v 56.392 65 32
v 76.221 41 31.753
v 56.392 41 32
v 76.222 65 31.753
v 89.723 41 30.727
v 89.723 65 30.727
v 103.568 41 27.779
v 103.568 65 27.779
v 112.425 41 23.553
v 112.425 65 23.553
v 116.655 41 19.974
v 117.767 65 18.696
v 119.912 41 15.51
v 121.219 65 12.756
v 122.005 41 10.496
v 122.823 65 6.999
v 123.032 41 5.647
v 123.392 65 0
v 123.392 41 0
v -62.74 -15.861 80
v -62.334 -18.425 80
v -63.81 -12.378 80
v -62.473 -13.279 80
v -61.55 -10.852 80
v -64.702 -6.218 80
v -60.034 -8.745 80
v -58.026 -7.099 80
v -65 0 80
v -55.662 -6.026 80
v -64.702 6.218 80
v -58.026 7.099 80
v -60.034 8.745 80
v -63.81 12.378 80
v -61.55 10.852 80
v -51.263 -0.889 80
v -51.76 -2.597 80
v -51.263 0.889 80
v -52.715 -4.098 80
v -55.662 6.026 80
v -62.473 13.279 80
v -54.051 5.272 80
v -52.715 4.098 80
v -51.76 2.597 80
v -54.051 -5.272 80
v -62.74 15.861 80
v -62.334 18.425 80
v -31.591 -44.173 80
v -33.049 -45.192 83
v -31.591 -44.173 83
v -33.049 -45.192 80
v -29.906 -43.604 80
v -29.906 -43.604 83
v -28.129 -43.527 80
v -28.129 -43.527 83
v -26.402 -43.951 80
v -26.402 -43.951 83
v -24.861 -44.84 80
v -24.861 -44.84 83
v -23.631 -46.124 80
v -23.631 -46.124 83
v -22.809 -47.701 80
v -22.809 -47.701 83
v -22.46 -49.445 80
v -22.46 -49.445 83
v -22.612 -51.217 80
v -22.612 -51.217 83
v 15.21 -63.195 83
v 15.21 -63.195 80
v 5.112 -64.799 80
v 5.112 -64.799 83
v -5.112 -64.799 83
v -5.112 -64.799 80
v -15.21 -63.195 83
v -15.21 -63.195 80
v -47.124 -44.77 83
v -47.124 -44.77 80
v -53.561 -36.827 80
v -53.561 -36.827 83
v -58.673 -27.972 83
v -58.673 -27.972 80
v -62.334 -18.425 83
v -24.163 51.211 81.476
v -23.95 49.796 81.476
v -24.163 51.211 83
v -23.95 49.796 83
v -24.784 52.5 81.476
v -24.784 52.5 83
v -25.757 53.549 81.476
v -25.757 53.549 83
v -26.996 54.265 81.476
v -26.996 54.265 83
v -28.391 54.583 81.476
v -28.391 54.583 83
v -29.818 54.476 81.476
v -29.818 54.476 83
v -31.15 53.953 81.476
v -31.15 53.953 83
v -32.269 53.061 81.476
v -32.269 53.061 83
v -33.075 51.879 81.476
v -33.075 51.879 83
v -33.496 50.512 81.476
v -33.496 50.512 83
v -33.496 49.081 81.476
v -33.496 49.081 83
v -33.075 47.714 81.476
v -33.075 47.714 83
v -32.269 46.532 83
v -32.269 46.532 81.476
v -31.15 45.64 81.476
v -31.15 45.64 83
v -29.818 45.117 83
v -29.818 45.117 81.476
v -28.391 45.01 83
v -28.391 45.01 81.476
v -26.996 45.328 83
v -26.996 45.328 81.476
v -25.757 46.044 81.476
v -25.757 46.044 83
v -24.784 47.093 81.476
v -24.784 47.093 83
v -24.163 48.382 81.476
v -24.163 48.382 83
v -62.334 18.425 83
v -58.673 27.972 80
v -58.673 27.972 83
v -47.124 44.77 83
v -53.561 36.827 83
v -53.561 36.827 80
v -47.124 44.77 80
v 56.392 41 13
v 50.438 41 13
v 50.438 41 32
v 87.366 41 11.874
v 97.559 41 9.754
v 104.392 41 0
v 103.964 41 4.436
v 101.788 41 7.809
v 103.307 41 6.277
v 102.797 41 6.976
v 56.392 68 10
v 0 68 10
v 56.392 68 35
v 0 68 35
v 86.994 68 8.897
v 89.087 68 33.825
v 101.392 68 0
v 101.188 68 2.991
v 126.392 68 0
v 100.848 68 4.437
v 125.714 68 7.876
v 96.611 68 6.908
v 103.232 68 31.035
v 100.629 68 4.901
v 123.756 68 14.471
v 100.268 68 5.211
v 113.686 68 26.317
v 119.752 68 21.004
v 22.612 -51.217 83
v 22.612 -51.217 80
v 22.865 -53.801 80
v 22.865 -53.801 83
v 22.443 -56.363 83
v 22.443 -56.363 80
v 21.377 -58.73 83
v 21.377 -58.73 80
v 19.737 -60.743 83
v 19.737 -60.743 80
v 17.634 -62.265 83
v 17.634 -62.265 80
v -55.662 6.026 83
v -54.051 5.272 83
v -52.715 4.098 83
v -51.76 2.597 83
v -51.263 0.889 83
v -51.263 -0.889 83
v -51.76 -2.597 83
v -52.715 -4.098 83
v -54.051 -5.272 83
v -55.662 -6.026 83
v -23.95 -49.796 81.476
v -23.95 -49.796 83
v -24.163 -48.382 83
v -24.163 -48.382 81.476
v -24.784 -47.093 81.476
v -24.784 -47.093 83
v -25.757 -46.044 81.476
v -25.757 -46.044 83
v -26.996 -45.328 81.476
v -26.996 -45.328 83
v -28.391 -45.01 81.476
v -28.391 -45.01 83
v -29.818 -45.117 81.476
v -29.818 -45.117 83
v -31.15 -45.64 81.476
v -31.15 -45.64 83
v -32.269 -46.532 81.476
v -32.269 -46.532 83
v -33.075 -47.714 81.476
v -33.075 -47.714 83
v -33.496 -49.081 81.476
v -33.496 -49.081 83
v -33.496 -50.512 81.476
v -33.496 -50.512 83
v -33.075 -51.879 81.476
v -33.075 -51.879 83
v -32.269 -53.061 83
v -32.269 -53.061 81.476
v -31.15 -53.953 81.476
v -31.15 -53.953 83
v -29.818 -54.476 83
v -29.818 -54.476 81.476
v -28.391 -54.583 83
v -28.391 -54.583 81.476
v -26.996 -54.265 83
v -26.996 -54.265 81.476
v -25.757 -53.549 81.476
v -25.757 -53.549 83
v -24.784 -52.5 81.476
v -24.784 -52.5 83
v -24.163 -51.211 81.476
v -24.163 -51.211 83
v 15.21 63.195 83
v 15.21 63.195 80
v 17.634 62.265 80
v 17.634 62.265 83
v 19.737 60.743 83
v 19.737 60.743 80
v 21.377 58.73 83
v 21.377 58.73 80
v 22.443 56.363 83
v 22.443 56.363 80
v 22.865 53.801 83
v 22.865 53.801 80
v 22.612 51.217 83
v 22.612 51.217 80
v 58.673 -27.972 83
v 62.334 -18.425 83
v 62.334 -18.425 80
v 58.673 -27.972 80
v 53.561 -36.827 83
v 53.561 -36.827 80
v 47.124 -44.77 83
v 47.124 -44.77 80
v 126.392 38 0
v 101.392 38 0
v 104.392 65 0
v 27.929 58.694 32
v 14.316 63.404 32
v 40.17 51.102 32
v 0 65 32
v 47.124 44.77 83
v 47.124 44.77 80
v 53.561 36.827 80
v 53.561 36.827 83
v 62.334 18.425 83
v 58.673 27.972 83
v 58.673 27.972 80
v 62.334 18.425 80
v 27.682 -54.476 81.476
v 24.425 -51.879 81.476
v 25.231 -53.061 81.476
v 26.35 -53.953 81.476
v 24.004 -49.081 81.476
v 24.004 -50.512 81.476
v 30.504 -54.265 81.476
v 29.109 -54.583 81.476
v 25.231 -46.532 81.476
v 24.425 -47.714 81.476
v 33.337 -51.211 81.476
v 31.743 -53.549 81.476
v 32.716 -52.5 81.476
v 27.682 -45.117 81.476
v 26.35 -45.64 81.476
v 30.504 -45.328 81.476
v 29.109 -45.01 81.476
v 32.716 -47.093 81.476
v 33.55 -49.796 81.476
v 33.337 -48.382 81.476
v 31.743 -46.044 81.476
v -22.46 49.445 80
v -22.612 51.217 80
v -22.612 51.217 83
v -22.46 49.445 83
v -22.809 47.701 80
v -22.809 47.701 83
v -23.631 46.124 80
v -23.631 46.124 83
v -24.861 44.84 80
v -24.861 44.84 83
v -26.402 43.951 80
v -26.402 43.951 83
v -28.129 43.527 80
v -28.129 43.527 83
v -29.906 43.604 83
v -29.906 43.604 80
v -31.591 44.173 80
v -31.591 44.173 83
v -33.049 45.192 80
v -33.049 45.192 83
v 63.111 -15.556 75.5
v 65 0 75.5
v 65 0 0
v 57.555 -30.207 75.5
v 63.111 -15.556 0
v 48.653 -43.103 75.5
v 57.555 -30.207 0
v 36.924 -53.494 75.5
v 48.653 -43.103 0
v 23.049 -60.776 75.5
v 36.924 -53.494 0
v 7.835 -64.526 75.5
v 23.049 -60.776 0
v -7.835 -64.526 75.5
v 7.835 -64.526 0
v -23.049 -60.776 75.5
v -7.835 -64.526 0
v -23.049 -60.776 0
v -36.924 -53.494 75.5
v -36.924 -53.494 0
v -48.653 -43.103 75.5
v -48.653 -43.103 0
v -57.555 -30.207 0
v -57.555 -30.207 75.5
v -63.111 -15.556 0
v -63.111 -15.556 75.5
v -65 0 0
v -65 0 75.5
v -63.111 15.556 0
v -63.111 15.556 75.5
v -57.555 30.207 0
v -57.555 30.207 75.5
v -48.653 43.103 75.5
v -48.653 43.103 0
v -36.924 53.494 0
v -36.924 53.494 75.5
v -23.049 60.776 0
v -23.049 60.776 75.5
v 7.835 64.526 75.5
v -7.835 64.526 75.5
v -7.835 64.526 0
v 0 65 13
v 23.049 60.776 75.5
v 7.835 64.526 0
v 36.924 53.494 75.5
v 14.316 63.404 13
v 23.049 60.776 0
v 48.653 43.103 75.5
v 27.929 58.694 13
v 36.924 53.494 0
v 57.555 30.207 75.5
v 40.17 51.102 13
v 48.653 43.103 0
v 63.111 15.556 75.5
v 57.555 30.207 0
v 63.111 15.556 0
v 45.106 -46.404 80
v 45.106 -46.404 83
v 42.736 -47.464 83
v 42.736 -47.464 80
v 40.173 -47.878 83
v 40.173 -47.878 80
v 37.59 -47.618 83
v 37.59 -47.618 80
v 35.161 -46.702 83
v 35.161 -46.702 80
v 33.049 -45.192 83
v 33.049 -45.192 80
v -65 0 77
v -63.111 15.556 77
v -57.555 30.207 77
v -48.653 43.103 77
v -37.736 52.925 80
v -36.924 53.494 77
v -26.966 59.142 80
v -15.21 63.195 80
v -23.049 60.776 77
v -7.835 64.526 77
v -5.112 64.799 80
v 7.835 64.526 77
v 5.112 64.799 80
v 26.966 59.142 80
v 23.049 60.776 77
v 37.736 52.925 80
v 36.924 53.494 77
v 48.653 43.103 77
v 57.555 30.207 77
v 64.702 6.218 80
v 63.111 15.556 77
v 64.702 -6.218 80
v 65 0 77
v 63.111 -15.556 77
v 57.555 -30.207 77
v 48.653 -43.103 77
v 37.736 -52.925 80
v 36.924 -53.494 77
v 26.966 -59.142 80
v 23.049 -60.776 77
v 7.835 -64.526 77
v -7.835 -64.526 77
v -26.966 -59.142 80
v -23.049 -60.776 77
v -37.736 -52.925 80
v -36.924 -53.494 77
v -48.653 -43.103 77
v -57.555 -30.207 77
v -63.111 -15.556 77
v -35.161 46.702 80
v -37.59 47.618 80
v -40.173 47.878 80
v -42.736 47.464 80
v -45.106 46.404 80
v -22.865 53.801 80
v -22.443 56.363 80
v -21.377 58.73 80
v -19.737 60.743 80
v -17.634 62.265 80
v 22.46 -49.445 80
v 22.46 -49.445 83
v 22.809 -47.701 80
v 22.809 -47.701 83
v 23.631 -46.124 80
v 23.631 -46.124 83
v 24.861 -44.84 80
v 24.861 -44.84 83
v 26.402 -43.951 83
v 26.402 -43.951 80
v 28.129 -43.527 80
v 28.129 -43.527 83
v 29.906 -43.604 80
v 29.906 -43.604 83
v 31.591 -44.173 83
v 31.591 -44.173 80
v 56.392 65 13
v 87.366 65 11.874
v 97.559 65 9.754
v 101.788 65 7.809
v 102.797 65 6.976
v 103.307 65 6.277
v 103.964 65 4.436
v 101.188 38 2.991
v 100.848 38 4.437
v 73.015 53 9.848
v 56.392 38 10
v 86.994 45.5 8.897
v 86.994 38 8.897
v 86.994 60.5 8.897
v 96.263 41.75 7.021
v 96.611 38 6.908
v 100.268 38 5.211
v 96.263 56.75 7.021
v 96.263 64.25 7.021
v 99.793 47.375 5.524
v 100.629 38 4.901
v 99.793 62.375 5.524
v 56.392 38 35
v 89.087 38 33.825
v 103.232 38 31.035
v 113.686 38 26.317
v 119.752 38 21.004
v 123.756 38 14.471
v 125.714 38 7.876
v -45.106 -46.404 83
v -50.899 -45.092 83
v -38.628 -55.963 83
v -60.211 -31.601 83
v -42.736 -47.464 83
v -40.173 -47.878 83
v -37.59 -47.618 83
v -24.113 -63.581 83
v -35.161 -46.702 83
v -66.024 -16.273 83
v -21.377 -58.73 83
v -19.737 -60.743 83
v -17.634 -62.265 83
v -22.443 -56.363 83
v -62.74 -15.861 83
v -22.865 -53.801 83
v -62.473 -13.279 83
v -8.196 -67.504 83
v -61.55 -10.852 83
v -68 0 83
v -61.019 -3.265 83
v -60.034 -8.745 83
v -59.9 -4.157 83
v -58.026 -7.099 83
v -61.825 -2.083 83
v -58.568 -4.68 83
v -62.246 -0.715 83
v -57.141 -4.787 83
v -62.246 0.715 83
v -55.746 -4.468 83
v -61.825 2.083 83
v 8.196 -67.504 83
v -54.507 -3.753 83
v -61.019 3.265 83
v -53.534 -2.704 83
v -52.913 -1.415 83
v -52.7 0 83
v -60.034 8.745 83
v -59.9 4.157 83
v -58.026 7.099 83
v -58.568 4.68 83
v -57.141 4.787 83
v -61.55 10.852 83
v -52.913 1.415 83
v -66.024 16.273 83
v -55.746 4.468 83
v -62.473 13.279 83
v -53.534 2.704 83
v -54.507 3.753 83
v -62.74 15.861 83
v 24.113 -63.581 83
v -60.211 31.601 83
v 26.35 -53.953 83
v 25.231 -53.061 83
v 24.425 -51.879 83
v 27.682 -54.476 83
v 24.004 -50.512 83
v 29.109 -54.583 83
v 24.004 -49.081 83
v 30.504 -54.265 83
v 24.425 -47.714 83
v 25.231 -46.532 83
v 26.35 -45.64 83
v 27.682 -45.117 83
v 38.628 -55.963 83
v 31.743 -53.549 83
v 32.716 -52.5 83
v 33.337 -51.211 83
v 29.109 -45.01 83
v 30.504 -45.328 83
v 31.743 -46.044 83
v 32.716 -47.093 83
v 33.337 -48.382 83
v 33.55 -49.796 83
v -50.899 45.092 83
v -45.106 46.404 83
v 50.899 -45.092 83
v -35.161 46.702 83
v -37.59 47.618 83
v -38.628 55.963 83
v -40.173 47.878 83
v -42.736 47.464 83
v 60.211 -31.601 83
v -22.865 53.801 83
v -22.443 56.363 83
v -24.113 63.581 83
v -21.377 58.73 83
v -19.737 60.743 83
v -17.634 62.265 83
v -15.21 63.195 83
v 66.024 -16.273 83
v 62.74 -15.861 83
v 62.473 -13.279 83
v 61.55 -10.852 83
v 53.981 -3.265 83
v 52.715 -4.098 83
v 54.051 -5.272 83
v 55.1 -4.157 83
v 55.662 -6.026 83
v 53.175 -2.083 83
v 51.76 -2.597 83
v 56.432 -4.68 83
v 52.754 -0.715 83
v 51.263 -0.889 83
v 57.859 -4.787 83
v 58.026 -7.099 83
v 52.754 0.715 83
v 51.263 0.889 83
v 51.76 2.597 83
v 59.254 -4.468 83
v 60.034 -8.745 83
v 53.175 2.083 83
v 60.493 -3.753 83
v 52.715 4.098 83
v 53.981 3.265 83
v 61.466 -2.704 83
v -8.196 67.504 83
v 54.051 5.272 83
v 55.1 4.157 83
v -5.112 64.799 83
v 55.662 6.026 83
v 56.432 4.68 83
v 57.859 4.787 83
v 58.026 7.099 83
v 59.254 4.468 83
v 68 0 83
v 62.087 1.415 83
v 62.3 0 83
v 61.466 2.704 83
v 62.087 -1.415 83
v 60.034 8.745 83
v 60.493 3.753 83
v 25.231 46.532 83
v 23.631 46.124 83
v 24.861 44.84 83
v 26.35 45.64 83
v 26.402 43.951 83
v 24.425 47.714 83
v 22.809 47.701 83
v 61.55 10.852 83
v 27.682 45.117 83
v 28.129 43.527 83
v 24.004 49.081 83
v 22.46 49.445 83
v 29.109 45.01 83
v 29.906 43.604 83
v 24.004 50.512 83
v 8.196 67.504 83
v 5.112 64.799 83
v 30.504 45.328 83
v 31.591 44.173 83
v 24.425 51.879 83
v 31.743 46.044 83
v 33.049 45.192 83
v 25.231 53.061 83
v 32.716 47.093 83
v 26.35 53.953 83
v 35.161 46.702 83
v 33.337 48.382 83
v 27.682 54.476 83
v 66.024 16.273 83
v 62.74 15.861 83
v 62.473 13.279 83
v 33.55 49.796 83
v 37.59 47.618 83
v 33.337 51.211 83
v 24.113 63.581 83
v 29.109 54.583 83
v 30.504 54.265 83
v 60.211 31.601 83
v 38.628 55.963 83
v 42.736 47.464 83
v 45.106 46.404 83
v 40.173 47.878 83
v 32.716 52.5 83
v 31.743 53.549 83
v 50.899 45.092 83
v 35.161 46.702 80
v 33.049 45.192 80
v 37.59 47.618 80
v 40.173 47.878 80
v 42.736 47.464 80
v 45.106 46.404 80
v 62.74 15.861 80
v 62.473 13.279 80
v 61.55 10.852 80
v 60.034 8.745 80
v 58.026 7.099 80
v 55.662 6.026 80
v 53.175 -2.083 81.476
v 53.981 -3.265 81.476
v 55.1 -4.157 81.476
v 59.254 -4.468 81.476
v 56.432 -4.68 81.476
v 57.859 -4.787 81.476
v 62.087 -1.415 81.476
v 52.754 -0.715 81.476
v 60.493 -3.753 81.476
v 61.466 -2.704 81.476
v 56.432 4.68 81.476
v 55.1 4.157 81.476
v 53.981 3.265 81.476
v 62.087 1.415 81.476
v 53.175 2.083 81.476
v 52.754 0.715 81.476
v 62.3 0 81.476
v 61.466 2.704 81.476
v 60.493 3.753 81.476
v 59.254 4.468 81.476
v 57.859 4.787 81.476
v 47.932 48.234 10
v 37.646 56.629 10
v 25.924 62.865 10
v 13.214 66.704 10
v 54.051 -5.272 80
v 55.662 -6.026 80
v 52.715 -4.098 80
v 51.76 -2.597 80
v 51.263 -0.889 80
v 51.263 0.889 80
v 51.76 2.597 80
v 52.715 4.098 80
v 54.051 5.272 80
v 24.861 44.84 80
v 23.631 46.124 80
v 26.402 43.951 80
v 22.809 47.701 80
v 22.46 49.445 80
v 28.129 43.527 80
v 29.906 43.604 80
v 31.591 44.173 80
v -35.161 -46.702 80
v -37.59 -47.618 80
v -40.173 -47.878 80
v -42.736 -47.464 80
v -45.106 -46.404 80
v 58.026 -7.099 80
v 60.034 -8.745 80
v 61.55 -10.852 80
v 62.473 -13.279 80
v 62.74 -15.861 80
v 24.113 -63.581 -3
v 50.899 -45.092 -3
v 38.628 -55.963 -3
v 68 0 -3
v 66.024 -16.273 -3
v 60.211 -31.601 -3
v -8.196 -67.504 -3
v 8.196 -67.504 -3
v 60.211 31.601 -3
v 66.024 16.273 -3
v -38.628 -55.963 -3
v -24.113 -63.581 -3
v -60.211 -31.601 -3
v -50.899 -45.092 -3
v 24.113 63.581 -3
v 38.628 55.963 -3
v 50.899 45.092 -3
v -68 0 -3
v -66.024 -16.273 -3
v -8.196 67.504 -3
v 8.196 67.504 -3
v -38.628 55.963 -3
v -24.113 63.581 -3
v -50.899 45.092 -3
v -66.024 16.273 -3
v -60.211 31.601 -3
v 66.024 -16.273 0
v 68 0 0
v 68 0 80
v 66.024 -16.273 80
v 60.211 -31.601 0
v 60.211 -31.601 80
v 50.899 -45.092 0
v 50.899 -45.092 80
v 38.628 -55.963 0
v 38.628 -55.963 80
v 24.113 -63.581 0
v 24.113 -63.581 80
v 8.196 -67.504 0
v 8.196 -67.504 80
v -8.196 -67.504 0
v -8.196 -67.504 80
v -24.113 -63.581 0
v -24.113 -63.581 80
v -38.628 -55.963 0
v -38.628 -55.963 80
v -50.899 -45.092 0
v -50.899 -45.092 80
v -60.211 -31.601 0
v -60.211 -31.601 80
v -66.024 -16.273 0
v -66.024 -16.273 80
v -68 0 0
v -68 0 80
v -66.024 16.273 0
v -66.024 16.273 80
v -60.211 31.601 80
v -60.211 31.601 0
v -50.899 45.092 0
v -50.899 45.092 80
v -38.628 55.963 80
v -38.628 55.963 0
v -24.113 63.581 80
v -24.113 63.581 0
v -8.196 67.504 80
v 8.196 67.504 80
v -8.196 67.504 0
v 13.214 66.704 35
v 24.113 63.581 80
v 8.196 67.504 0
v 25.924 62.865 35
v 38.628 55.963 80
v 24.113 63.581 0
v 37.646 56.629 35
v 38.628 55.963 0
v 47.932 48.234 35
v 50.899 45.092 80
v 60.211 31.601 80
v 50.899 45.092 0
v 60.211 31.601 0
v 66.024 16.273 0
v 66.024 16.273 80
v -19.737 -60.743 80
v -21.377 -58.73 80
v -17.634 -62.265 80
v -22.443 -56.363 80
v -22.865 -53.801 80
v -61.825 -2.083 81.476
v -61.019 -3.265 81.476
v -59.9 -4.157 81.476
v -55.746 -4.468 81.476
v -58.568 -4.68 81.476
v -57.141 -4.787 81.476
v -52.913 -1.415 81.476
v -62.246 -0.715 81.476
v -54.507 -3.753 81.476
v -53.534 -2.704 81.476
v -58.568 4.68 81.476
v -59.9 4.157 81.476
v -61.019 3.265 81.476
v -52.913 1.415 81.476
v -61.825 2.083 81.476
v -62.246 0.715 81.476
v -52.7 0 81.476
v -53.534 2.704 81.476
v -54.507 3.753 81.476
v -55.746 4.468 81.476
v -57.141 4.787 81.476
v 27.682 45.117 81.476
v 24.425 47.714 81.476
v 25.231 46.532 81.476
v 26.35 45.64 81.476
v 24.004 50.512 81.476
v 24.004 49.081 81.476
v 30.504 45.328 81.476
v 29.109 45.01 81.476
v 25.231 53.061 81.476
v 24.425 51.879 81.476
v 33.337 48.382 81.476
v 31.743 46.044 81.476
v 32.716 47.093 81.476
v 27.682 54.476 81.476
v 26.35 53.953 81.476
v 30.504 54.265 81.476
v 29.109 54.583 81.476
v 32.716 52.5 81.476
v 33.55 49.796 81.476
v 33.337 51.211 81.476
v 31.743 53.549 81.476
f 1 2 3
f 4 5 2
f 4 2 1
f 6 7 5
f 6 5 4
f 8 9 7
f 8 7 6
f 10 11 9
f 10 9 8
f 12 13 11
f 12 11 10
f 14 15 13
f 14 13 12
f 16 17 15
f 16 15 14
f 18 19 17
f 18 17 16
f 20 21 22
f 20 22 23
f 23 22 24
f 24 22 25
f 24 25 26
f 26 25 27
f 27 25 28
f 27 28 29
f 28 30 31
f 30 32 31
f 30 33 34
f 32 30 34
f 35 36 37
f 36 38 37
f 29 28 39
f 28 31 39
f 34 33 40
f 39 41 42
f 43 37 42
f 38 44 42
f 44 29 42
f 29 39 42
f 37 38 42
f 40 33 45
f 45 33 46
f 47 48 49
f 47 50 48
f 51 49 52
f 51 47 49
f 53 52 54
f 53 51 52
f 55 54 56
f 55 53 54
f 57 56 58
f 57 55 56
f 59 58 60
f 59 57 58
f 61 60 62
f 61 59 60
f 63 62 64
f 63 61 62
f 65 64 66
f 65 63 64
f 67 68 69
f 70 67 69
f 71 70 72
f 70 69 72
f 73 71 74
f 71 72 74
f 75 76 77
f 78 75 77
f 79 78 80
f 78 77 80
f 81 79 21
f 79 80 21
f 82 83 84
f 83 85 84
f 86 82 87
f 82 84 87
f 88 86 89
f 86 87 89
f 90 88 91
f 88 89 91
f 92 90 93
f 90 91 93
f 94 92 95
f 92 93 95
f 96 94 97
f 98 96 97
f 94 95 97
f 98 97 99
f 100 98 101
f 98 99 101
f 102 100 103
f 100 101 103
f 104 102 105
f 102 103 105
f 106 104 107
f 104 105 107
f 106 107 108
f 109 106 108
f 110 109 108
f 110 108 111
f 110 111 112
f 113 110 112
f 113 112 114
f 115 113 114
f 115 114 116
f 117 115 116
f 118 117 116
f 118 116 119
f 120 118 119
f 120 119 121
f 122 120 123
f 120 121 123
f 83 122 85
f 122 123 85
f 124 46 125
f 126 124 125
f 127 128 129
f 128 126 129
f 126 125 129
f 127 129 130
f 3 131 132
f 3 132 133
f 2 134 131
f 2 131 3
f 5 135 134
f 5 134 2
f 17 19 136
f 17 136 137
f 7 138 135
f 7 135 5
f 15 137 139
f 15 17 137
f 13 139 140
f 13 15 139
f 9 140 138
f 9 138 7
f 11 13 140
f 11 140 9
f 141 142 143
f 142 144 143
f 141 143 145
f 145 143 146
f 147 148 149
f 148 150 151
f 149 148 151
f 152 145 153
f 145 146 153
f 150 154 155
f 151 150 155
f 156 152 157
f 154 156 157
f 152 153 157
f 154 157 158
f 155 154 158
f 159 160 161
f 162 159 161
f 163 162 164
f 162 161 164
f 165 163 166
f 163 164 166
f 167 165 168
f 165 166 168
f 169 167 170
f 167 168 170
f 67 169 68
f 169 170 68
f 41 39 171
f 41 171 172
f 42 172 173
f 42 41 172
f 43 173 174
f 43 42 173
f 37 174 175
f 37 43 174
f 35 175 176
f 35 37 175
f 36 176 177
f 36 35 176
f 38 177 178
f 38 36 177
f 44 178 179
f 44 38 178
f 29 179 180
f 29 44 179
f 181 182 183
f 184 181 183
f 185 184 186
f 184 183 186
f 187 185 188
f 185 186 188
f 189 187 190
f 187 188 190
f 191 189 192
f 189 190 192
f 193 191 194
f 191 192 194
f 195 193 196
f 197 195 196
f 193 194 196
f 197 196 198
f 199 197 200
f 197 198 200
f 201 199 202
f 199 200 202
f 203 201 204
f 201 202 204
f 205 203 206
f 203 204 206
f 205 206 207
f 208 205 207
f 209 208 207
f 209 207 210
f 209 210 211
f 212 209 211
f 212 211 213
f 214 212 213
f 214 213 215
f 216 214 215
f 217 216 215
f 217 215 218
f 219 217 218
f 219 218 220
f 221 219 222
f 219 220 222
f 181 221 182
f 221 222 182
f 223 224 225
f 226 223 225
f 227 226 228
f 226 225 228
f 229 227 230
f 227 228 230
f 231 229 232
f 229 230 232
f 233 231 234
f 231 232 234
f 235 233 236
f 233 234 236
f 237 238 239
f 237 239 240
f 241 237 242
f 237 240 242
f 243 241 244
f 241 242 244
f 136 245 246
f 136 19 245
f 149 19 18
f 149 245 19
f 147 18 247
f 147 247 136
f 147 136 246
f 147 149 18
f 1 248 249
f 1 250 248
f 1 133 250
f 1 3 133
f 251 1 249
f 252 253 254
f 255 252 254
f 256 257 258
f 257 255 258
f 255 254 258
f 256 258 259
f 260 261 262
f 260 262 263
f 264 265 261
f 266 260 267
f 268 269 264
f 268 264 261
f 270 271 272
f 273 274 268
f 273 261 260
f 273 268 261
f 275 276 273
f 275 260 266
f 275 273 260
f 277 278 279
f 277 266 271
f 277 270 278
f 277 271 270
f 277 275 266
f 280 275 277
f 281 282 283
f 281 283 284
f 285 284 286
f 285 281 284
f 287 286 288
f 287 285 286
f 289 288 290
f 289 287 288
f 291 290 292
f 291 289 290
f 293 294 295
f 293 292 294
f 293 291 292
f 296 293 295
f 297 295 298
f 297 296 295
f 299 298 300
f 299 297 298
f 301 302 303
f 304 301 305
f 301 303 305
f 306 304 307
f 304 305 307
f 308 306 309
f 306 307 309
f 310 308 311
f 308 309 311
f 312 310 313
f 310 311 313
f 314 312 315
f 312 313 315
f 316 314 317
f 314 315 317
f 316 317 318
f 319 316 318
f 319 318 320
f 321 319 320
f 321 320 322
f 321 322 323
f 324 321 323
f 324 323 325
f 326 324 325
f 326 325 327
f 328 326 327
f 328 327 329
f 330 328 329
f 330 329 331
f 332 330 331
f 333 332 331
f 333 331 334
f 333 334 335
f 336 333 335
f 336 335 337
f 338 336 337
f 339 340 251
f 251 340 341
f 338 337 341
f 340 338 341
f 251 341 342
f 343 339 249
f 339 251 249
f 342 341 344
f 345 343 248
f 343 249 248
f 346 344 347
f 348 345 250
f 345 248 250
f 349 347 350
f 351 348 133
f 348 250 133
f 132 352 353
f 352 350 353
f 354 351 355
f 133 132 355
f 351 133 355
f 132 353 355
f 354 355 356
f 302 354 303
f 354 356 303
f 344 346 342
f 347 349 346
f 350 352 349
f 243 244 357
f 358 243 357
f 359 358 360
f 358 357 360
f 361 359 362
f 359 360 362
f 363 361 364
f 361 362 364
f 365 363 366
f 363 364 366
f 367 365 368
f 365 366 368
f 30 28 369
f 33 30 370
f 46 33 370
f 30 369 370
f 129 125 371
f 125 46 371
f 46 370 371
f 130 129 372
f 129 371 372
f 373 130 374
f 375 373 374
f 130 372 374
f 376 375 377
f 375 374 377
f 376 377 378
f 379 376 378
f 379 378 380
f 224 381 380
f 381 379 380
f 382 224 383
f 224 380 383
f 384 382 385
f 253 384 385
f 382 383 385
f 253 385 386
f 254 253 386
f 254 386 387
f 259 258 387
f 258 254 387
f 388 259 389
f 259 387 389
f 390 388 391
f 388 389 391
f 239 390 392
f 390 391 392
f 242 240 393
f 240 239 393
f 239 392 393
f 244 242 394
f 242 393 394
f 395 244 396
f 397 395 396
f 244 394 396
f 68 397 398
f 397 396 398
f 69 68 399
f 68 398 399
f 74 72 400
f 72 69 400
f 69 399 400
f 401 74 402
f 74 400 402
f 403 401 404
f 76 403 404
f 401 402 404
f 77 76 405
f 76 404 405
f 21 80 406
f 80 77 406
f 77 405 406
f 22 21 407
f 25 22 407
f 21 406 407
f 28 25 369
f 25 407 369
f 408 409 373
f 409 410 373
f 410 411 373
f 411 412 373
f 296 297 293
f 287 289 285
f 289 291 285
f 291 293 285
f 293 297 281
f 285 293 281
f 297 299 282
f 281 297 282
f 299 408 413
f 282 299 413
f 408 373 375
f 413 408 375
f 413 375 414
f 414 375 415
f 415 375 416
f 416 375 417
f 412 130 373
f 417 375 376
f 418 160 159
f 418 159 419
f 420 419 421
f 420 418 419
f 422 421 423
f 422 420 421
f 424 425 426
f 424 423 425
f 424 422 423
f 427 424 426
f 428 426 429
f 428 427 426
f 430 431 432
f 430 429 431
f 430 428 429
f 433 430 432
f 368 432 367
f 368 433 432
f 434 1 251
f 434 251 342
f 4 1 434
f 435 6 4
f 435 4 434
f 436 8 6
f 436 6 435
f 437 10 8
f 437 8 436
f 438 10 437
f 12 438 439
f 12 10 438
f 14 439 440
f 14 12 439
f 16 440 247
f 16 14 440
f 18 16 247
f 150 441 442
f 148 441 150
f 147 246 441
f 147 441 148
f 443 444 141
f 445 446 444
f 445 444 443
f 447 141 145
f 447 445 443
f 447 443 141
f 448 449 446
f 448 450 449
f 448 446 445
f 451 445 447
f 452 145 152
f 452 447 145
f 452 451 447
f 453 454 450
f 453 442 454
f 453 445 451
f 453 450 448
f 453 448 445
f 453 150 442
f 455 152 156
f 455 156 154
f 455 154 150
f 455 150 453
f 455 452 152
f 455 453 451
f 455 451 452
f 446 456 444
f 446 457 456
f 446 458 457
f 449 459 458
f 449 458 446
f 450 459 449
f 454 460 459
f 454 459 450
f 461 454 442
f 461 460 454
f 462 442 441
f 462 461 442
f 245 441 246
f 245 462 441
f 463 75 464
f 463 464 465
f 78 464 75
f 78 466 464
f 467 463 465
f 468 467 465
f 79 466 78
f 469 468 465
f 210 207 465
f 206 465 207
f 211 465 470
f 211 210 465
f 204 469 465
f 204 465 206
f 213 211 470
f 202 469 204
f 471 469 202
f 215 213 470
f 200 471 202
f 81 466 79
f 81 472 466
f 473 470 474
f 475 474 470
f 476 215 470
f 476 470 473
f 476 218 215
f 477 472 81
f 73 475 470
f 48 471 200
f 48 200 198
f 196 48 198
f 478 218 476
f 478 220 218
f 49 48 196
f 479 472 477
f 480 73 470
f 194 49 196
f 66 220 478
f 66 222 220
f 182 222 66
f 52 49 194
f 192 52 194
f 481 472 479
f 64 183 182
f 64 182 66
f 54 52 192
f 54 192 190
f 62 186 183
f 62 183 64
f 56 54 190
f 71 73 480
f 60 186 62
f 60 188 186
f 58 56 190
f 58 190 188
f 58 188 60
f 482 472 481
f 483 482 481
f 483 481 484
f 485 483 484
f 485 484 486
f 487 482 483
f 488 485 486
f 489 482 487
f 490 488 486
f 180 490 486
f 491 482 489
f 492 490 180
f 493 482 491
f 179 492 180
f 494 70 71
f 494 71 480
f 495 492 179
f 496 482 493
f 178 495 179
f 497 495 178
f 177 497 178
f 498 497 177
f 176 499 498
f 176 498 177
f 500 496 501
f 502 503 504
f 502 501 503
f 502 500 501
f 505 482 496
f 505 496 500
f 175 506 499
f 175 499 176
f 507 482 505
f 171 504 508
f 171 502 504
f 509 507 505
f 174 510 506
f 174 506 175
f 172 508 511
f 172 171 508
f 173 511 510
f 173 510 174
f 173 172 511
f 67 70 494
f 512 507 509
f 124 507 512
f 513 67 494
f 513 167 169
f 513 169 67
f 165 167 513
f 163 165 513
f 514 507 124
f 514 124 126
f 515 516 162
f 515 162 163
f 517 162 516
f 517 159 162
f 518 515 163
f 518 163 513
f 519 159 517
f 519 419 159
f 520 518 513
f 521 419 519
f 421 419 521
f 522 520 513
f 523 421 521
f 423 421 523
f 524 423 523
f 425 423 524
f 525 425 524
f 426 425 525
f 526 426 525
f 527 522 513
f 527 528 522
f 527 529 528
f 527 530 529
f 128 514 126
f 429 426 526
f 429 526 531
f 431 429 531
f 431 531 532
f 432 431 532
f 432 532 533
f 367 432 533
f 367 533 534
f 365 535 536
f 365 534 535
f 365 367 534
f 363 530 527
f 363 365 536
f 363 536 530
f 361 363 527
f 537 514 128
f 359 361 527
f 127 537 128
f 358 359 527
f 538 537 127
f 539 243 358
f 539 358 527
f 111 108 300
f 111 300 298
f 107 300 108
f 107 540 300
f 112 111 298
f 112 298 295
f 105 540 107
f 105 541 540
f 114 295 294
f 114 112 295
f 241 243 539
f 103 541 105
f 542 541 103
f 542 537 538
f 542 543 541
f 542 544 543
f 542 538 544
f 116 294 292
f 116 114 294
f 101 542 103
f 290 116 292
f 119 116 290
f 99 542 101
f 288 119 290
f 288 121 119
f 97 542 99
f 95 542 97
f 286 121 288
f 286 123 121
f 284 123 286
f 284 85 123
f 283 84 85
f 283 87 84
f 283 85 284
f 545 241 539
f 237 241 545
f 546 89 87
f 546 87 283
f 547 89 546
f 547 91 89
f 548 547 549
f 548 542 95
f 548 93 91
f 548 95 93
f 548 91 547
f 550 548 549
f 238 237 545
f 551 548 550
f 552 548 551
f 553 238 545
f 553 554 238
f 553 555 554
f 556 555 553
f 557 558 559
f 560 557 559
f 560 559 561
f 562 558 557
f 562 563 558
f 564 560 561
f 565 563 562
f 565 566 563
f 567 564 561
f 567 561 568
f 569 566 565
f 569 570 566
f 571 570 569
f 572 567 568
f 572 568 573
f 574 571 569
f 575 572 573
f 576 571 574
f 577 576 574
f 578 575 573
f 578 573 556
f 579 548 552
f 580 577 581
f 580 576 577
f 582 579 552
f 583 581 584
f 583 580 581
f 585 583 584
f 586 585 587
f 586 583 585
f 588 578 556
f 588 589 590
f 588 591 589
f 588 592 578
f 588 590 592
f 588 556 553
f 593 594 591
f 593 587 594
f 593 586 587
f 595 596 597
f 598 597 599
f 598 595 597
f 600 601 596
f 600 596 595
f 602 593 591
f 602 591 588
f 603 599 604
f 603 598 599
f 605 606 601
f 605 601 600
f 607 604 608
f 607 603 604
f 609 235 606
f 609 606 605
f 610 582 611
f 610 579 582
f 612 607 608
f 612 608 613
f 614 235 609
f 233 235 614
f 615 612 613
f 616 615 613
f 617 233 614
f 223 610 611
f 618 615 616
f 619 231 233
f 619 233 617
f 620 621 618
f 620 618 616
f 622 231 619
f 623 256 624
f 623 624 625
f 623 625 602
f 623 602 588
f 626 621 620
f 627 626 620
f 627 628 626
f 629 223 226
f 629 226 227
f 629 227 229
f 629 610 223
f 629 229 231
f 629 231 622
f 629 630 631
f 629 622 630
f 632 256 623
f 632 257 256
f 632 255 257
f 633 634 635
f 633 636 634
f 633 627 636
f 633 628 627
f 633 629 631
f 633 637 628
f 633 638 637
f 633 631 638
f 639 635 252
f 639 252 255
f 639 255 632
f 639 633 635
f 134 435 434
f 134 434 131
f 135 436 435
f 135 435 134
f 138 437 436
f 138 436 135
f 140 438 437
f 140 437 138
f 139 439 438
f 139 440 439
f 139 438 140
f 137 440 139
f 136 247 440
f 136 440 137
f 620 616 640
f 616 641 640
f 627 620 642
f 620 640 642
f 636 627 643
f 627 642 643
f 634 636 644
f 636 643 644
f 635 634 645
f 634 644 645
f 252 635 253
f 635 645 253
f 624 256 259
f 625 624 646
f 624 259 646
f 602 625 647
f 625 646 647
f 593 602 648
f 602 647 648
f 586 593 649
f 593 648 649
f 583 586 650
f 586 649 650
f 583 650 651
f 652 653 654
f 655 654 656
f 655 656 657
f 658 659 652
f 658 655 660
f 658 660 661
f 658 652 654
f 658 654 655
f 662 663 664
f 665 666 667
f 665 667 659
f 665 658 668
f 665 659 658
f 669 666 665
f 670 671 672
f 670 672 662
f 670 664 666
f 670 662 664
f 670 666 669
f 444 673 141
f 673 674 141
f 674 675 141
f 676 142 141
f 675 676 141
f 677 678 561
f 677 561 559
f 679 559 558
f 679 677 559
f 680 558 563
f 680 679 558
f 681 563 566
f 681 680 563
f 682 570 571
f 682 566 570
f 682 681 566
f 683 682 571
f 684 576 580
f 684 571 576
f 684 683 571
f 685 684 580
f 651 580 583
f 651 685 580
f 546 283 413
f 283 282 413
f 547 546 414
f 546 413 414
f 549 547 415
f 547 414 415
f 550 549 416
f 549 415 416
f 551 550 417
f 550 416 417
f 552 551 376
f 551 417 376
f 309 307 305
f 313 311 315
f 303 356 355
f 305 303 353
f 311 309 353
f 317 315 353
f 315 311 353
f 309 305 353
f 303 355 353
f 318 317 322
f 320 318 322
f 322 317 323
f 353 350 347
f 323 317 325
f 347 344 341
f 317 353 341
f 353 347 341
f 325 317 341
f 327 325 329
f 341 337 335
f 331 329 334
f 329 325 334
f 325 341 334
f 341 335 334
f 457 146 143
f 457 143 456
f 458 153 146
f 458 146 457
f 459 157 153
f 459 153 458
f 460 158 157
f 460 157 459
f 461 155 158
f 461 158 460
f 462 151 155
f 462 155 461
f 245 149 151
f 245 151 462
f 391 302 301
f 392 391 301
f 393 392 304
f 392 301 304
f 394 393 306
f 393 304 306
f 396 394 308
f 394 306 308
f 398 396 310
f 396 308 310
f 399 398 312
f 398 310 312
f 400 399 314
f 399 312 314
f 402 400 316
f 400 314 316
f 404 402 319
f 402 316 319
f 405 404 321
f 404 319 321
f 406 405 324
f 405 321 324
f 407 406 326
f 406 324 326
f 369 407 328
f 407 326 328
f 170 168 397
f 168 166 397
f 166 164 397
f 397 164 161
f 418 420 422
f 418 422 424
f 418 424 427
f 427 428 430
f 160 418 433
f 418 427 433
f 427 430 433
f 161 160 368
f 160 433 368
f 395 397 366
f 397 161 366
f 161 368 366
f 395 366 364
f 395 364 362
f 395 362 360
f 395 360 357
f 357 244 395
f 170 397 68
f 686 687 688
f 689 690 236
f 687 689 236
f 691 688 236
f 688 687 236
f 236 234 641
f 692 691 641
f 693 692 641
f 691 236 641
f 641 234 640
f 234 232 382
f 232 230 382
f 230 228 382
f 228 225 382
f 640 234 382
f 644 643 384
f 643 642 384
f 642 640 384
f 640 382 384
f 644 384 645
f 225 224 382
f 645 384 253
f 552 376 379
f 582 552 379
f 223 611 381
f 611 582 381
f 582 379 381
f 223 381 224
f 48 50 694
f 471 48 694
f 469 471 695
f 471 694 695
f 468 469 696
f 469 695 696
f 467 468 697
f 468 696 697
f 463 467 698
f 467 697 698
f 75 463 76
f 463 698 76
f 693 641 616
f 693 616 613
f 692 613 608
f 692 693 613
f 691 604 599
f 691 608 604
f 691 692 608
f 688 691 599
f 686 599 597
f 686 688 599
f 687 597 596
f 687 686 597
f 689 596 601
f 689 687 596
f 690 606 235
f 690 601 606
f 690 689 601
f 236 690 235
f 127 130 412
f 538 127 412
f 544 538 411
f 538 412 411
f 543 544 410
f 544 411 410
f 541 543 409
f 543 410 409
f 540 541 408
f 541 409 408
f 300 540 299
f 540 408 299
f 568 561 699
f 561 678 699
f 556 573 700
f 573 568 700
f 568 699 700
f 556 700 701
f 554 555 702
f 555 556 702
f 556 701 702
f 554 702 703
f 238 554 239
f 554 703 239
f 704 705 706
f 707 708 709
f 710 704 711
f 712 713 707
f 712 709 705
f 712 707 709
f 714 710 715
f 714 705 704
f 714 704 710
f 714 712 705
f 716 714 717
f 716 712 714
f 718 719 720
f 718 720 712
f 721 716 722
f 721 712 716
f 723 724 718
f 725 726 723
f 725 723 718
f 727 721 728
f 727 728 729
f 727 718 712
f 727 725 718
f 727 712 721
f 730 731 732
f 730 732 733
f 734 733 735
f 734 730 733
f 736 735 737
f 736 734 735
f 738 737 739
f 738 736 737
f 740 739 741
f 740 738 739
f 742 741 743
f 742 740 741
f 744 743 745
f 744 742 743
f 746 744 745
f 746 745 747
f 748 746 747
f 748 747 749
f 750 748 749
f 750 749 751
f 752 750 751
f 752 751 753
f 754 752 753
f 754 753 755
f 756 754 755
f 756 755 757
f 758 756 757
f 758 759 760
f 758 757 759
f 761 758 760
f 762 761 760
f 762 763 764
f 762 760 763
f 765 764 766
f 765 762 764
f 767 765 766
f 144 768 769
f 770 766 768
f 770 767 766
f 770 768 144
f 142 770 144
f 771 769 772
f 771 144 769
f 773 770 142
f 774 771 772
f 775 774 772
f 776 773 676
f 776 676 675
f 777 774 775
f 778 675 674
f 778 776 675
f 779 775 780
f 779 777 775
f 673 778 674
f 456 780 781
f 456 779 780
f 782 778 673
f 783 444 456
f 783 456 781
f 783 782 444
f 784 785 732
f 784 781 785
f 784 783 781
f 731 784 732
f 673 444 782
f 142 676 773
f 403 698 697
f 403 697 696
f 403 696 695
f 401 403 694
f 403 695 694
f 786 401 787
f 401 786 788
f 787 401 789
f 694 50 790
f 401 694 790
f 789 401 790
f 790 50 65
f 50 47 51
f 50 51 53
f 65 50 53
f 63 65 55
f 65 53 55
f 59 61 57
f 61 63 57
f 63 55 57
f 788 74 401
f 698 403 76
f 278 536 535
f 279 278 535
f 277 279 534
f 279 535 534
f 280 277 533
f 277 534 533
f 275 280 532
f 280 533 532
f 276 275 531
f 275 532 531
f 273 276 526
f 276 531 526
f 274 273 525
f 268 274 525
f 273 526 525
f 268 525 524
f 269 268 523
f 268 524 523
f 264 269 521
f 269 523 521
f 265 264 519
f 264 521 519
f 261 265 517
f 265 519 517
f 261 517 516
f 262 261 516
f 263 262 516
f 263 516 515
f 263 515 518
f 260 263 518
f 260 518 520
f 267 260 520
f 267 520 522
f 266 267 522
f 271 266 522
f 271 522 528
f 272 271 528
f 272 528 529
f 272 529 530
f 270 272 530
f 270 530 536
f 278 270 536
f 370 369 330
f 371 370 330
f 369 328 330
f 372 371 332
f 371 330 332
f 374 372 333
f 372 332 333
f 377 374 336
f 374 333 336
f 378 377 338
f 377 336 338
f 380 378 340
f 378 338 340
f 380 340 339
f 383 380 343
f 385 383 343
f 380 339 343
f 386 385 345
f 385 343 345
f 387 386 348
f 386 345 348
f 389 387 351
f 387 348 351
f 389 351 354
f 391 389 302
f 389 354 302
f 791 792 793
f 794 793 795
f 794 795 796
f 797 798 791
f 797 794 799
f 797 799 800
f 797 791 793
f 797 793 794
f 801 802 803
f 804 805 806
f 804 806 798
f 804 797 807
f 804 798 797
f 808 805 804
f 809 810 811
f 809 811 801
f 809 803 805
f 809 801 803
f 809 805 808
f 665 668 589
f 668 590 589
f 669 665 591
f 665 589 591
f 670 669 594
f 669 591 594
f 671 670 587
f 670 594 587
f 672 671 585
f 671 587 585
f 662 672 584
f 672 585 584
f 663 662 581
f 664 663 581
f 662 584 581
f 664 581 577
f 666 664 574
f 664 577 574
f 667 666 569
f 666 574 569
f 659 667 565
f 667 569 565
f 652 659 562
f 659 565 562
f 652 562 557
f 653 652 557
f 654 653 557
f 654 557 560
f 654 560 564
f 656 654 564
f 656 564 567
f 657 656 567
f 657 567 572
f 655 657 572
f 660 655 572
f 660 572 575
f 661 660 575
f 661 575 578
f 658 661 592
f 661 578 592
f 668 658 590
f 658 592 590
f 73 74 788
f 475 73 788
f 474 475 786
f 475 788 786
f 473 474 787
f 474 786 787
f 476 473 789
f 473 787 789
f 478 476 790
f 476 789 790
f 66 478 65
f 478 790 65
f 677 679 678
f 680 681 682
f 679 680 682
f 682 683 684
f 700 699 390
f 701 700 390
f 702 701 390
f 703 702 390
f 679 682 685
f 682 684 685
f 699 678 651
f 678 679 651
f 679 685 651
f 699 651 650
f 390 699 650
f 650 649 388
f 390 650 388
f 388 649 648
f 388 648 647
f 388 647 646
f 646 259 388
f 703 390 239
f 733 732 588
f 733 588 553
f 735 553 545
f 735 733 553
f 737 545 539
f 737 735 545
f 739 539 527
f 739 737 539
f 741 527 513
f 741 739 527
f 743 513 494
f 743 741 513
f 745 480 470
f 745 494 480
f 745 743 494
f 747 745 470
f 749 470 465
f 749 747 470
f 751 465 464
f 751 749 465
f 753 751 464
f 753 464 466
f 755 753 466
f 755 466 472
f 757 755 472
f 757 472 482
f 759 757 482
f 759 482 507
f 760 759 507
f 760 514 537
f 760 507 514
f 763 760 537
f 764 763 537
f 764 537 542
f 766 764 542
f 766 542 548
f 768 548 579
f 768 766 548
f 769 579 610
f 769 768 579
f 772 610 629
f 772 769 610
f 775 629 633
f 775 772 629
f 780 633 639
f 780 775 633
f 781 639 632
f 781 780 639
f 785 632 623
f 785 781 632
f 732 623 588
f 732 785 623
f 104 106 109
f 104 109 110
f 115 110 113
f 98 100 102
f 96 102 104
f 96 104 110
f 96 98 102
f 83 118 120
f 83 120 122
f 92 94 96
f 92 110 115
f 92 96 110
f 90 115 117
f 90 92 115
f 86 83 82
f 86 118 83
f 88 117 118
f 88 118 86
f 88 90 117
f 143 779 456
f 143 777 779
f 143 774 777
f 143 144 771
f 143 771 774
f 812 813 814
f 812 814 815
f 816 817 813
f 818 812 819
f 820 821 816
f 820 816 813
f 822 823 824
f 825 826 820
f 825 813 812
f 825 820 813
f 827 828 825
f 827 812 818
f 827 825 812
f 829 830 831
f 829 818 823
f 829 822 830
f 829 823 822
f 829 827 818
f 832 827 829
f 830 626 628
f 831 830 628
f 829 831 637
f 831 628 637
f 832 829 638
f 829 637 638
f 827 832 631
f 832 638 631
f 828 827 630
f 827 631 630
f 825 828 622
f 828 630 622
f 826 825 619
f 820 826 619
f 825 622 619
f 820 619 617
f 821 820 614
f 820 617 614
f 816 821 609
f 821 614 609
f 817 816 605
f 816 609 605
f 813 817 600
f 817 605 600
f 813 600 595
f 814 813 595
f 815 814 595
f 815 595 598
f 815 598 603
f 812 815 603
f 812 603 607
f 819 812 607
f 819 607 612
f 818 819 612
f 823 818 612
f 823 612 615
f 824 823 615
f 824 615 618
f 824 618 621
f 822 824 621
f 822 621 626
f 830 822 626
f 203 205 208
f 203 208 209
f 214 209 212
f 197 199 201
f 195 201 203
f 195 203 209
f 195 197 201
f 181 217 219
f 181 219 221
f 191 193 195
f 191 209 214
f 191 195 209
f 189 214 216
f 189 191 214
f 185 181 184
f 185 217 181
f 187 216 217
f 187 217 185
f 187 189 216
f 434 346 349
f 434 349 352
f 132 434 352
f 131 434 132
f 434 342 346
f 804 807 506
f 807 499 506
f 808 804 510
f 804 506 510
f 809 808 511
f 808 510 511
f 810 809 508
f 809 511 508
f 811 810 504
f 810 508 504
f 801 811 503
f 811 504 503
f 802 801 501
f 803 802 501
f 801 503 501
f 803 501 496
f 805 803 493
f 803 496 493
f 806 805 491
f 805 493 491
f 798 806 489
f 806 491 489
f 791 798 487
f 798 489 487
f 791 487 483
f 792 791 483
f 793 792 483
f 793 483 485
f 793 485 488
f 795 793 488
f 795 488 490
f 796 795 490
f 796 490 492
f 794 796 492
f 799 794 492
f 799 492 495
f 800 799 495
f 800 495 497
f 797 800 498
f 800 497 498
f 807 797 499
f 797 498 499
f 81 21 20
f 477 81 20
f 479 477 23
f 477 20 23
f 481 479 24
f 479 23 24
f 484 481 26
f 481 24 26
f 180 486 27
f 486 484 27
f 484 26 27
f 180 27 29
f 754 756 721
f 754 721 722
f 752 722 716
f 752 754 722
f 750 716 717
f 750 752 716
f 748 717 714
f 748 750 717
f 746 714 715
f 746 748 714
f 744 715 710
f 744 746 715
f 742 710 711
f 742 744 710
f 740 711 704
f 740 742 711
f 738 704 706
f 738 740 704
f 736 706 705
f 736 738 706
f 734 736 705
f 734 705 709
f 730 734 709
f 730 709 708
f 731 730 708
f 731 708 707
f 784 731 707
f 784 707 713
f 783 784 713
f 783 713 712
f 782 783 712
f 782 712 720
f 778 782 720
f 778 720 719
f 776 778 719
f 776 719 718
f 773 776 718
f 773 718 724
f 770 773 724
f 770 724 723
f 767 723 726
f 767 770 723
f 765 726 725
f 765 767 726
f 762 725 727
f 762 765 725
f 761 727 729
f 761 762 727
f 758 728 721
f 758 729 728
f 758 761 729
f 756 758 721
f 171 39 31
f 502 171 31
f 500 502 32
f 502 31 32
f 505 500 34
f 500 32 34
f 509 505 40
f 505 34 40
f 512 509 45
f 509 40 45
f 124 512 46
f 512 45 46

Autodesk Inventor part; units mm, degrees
ref_plane "YZ Plane" through (0, 0, 0) normal (1, 0, 0) x (0, 1, 0)
sketch "Sketch1" plane through (0, 0, 0) normal (0, 0, 1) x (1, 0, 0)
  circle A0 centre (0, 0) radius 68
  dimension "d1" = 136
extrude "Extrusion1" add sketch "Sketch1" along normal blind 80
shell "Shell1" thickness 3 removed faces 1 at (13.6377, 7.7647, 0)
sketch "Sketch2" plane through (0, 0, 80) normal (0, 0, 1) x (1, 0, 0)
  circle A0 centre (0, 0) radius 32
  dimension "d5" = 64
extrude "Extrusion2" cut sketch "Sketch2" against normal up to surface (3 mm away)
sketch "Sketch3" plane through (0, 0, 77) normal (0, 0, -1) x (-1, 0, 0)
  circle A0 centre (0, 0) radius 32 projected
  circle A1 centre (0, 0) radius 65 projected
  circle A2 centre (0, -40) radius 4.8
  line L0 (0, 0) -> (0, -56.282) construction
  line L1 (0, 0) -> (-47.9956, 27.7103) construction
  line L2 (0, 0) -> (60.1339, 34.7183) construction
  circle A3 centre (-34.641, 20) radius 4.8
  circle A4 centre (34.641, 20) radius 4.8
  dimension "d8" = 9.6
  dimension "d9" = 40
  dimension "d10" = 120
  dimension "d11" = 120
  dimension "d12" = 9.6
  dimension "d13" = 9.6
  dimension "d14" = 40
  dimension "d15" = 40
extrude "Extrusion3" cut sketch "Sketch3" against normal blind 1.524 contours A2 | A3 | A4
ref_plane "Work Plane1" through (0, 0, 35) normal (0, 0, 1) x (1, 0, 0)
sketch "Sketch4" plane through (0, 0, 35) normal (0, 0, 1) x (1, 0, 0)
  circle A0 centre (0, 0) radius 68 projected
  circle A1 centre (0, 0) radius 68 projected
  line L0 (0, 68) -> (56.3915, 68)
  line L1 (56.3915, 68) -> (56.3915, 38)
  line L2 (56.3915, 38) -> (0, 38)
  line L3 (0, 38) -> (0, 68)
  dimension "d24" = 30
extrude "Extrusion4" add sketch "Sketch4" against normal blind 25 contours A0 L0 L1
sketch "Sketch6" plane through (56.3915, 38, 35) normal (1, 0, 0) x (0, 0, -1)
  line L0 (0, 0) -> (0, 30) projected
  line L1 (25, 0) -> (0, 0) projected
  line L2 (25, 30) -> (25, 0) projected
  line L3 (0, 30) -> (25, 30) projected
  line L4 (22, 27) -> (22, 3)
  line L5 (22, 3) -> (3, 3)
  line L6 (3, 3) -> (3, 27)
  line L7 (3, 27) -> (22, 27)
  point P0 (35, -38)
  dimension "d27" = 3
extrude "Extrusion5" cut sketch "Sketch6" against normal blind 56.391 contours L4 L5 L6 L7
ref_plane "Work Plane4" through (0, 68, 0) normal (0, 1, 0) x (-1, 0, 0)
sketch "Sketch9" plane through (56.3915, 38, 35) normal (1, 0, 0) x (0, 0, -1)
  line L0 (3, 3) -> (3, 27) projected
  line L1 (3, 27) -> (22, 27) projected
  line L2 (22, 27) -> (22, 3) projected
  line L3 (22, 3) -> (3, 3) projected
  line L4 (0, 0) -> (0, 30) projected
  line L5 (25, 0) -> (0, 0) projected
  line L6 (25, 30) -> (25, 0) projected
  line L7 (0, 30) -> (25, 30) projected
  point P0 (35, -38)
sketch "Sketch10" plane through (0, 68, 0) normal (0, 1, 0) x (-1, 0, 0)
  line L0 (-160.9388, 35) -> (106.1565, 35) projected
  line L1 (-56.3915, 35) -> (0, 35) projected
  line L2 (0, 0) -> (-96.3915, 0) construction
  line L3 (-68, 0) -> (-68, 80) projected
  line L4 (-56.3915, 35) -> (-91.3915, 35) construction
  line L5 (-91.3915, 35) -> (-126.3915, 35) construction
  line L6 (-126.3915, 35) -> (-126.3915, 0) construction
  spline S0 degree 3 poles (-56.3915, 35) (-91.3915, 35) (-126.3915, 35) (-126.3915, 0) knots 1 1 1 1 2 2 2 2
  line L7 (-126.3915, 0) -> (-126.3915, 60.9318) construction
  point P0 (-91.3915, 0)
  dimension "d113" = 70
  dimension "d114" = 35
  dimension "d115" = 35
sweep "Sweep2" add profiles "Sketch9" path "Sketch10" path curves S0
sketch "Sketch11" plane through (0, 0, 77) normal (0, 0, -1) x (-1, 0, 0)
  circle A0 centre (-34.641, 20) radius 4.8 projected
  circle A1 centre (34.641, 20) radius 4.8 projected
  circle A2 centre (0, -40) radius 4.8 projected
  circle A3 centre (0, 0) radius 32 projected
  circle A4 centre (0, 0) radius 65 projected
  circle A5 centre (-34.641, 20) radius 6.3
  circle A6 centre (34.641, 20) radius 6.3
  circle A7 centre (0, -40) radius 6.3
  circle A8 centre (0, 0) radius 33.5
  line L0 (-36.0415, 26.1424) -> (-7.4468, 32.6618)
  line L1 (-40.6607, 18.1416) -> (-32.0094, -9.8818)
  line L2 (36.0415, 26.1424) -> (7.4468, 32.6618)
  line L3 (40.6607, 18.1416) -> (32.0094, -9.8818)
  line L4 (4.6192, -44.284) -> (24.5626, -22.78)
  line L5 (-4.6192, -44.284) -> (-24.5626, -22.78)
  circle A9 centre (-34.641, 20) radius 7.8
  line L6 (-42.0939, 17.6992) -> (-34.7194, -6.1884)
  circle A10 centre (34.641, 20) radius 7.8
  circle A11 centre (0, -40) radius 7.8
  line L7 (-36.3749, 27.6048) -> (-12.0004, 33.1621)
  line L8 (36.3749, 27.6048) -> (12.0004, 33.1621)
  line L9 (42.0939, 17.6992) -> (34.7194, -6.1884)
  line L10 (5.7191, -45.304) -> (22.7191, -26.9737)
  line L11 (-5.7191, -45.304) -> (-22.7191, -26.9737)
  line L12 (-34.7194, -6.1884) -> (-33.2862, -5.746)
  line L13 (-22.7191, -26.9737) -> (-21.6192, -25.9537)
  line L14 (12.0004, 33.1621) -> (11.6669, 31.6997)
  line L15 (34.7194, -6.1884) -> (33.2862, -5.746)
  line L16 (22.7191, -26.9737) -> (21.6192, -25.9537)
  line L17 (-12.0004, 33.1621) -> (-11.6669, 31.6997)
  dimension "d39" = 1.5
  dimension "d40" = 1.5
  dimension "d41" = 1.5
  dimension "d42" = 1.5
  dimension "d43" = 1.5
  dimension "d44" = 1.5
  dimension "d45" = 1.5
  dimension "d46" = 25
  dimension "d47" = 25
  dimension "d48" = 25
  dimension "d49" = 25
  dimension "d50" = 25
  dimension "d51" = 25
extrude "Extrusion6" add sketch "Sketch11" along normal blind 1.5 contours A5 L1 A9 L0 | A9 L7 L17 L0 | L1 L12 L6 A9 | L14 L8 A10 L2 | L5 A11 L11 L13 | A10 L3 A6 L2 | L5 A7 L4 A11 | A10 L9 L15 L3 | L16 L10 A11 L4
sketch "Sketch14" plane through (0, 0, 80) normal (0, 0, 1) x (1, 0, 0)
  circle A0 centre (0, 0) radius 32 projected
  line L0 (0, 0) -> (0, 28.9416) construction
  circle A1 centre (0, 41) radius 3
  line L1 (0, 0) -> (-25.0642, -14.4708) construction
  line L2 (0, 0) -> (25.0642, -14.4708) construction
  point P0 (-35.507, -20.5)
  point P1 (-35.507, -20.5)
  point P2 (35.507, -20.5)
  point P3 (35.507, -20.5)
  dimension "d98" = 6
  dimension "d99" = 41
  dimension "d102" = 360
hole "Hole1" at (0, 41, 80) at (-35.507, -20.5, 80) at (35.507, -20.5, 80) direction (0, 0, -1) diameter 6 end through all
sketch "Sketch16" plane through (0, 0, 0) normal (0, 0, -1) x (-1, 0, 0)
  circle A0 centre (0, 0) radius 68 projected
extrude "Extrusion9" add sketch "Sketch16" along normal blind 3
sketch "Sketch17" plane through (0, 0, 75.5) normal (0, 0, -1) x (-1, 0, 0)
  circle A0 centre (0, 0) radius 65 projected
extrude "Extrusion10" cut sketch "Sketch17" against normal up to surface (4.5 mm away)
sketch "Sketch18" plane through (0, 0, 80) normal (0, 0, 1) x (1, 0, 0)
  circle A0 centre (0, 0) radius 65 projected
  circle A1 centre (0, 0) radius 68 projected
  line L0 (0, 0) -> (-83.6751, 0) construction
  circle A2 centre (-57.5, 0) radius 4.8
  circle A3 centre (-57.5, 0) radius 6.3
  circle A4 centre (-52.744, -15.5907) radius 10
  circle A5 centre (-52.744, 15.5907) radius 10
  circle A6 centre (0, 0) radius 65 projected
  circle A7 centre (-28.75, -49.7965) radius 6.3
  circle A8 centre (-28.75, -49.7965) radius 4.8
  circle A9 centre (-39.874, -37.8823) radius 10
  circle A10 centre (-12.87, -53.473) radius 10
  circle A11 centre (28.75, -49.7965) radius 6.3
  circle A12 centre (28.75, -49.7965) radius 4.8
  circle A13 centre (12.87, -53.473) radius 10
  circle A14 centre (39.874, -37.8823) radius 10
  circle A15 centre (57.5, 0) radius 6.3
  circle A16 centre (57.5, 0) radius 4.8
  circle A17 centre (52.744, -15.5907) radius 10
  circle A18 centre (52.744, 15.5907) radius 10
  circle A19 centre (28.75, 49.7965) radius 6.3
  circle A20 centre (28.75, 49.7965) radius 4.8
  circle A21 centre (39.874, 37.8823) radius 10
  circle A22 centre (12.87, 53.473) radius 10
  circle A23 centre (-28.75, 49.7965) radius 6.3
  circle A24 centre (-28.75, 49.7965) radius 4.8
  circle A25 centre (-12.87, 53.473) radius 10
  circle A26 centre (-39.874, 37.8823) radius 10
  point P0 (-55.6618, 6.0259)
  point P1 (-62.3338, 18.4254)
  point P2 (-47.1238, 44.77)
  point P3 (-33.0494, 45.1916)
  point P4 (-22.6123, 51.2175)
  point P5 (-15.2101, 63.1954)
  point P6 (15.2101, 63.1954)
  point P7 (22.6123, 51.2175)
  point P8 (33.0494, 45.1916)
  point P9 (47.1238, 44.77)
  point P10 (62.3338, 18.4254)
  point P11 (55.6618, 6.0259)
  point P12 (55.6618, -6.0259)
  point P13 (62.3338, -18.4254)
  point P14 (47.1238, -44.77)
  point P15 (33.0494, -45.1916)
  point P16 (22.6123, -51.2175)
  point P17 (15.2101, -63.1954)
  point P18 (-15.2101, -63.1954)
  point P19 (-22.6123, -51.2175)
  point P20 (-33.0494, -45.1916)
  point P21 (-47.1238, -44.77)
  point P22 (-62.3338, -18.4254)
  point P23 (-55.6618, -6.0259)
  dimension "d118" = 9.6
  dimension "d119" = 57.5
  dimension "d120" = 1.5
  dimension "d121" = 20
  dimension "d122" = 20
  dimension "d125" = 360
extrude "Extrusion11" add sketch "Sketch18" along normal blind 3 contours A0 A17 A15 A18 | A21 A19 A22 A0 | A15 | A0 A13 A11 A14 | A19 | A11 | A25 A23 A26 A0 | A0 A9 A7 A10 | A23 | A7 | A5 A3 A4 A0 | A3 | A1 | A2 | A8 | A12 | A16 | A20 | A24
sketch "Sketch19" plane through (0, 0, 83) normal (0, 0, 1) x (1, 0, 0)
  line L0 (0, 0) -> (-55.7634, 0) construction
  circle A0 centre (0, 0) radius 68 projected
  circle A1 centre (-57.5, 0) radius 4.8
  circle A2 centre (-28.75, -49.7965) radius 4.8
  circle A3 centre (28.75, -49.7965) radius 4.8
  circle A4 centre (57.5, 0) radius 4.8
  circle A5 centre (28.75, 49.7965) radius 4.8
  circle A6 centre (-28.75, 49.7965) radius 4.8
  dimension "d129" = 9.6
  dimension "d130" = 57.5
  dimension "d133" = 360
extrude "Extrusion12" cut sketch "Sketch19" against normal blind 1.524 contours A1 | A2 | A3 | A4 | A5 | A6
equation "\"d11\" = d10"
equation "\"d12\" = d8"
equation "\"d13\" = d8"
equation "\"d14\" = d9"
equation "\"d15\" = d9"
equation "\"d40\" = d39"
equation "\"d41\" = d39"
equation "\"d42\" = d39"
equation "\"d44\" = d43"
equation "\"d45\" = d41"
equation "\"d47\" = d46"
equation "\"d48\" = d47"
equation "\"d49\" = d48"
equation "\"d50\" = d49"
equation "\"d51\" = d50"
equation "\"d122\" = d121"
properties part number "Dust Bin"
